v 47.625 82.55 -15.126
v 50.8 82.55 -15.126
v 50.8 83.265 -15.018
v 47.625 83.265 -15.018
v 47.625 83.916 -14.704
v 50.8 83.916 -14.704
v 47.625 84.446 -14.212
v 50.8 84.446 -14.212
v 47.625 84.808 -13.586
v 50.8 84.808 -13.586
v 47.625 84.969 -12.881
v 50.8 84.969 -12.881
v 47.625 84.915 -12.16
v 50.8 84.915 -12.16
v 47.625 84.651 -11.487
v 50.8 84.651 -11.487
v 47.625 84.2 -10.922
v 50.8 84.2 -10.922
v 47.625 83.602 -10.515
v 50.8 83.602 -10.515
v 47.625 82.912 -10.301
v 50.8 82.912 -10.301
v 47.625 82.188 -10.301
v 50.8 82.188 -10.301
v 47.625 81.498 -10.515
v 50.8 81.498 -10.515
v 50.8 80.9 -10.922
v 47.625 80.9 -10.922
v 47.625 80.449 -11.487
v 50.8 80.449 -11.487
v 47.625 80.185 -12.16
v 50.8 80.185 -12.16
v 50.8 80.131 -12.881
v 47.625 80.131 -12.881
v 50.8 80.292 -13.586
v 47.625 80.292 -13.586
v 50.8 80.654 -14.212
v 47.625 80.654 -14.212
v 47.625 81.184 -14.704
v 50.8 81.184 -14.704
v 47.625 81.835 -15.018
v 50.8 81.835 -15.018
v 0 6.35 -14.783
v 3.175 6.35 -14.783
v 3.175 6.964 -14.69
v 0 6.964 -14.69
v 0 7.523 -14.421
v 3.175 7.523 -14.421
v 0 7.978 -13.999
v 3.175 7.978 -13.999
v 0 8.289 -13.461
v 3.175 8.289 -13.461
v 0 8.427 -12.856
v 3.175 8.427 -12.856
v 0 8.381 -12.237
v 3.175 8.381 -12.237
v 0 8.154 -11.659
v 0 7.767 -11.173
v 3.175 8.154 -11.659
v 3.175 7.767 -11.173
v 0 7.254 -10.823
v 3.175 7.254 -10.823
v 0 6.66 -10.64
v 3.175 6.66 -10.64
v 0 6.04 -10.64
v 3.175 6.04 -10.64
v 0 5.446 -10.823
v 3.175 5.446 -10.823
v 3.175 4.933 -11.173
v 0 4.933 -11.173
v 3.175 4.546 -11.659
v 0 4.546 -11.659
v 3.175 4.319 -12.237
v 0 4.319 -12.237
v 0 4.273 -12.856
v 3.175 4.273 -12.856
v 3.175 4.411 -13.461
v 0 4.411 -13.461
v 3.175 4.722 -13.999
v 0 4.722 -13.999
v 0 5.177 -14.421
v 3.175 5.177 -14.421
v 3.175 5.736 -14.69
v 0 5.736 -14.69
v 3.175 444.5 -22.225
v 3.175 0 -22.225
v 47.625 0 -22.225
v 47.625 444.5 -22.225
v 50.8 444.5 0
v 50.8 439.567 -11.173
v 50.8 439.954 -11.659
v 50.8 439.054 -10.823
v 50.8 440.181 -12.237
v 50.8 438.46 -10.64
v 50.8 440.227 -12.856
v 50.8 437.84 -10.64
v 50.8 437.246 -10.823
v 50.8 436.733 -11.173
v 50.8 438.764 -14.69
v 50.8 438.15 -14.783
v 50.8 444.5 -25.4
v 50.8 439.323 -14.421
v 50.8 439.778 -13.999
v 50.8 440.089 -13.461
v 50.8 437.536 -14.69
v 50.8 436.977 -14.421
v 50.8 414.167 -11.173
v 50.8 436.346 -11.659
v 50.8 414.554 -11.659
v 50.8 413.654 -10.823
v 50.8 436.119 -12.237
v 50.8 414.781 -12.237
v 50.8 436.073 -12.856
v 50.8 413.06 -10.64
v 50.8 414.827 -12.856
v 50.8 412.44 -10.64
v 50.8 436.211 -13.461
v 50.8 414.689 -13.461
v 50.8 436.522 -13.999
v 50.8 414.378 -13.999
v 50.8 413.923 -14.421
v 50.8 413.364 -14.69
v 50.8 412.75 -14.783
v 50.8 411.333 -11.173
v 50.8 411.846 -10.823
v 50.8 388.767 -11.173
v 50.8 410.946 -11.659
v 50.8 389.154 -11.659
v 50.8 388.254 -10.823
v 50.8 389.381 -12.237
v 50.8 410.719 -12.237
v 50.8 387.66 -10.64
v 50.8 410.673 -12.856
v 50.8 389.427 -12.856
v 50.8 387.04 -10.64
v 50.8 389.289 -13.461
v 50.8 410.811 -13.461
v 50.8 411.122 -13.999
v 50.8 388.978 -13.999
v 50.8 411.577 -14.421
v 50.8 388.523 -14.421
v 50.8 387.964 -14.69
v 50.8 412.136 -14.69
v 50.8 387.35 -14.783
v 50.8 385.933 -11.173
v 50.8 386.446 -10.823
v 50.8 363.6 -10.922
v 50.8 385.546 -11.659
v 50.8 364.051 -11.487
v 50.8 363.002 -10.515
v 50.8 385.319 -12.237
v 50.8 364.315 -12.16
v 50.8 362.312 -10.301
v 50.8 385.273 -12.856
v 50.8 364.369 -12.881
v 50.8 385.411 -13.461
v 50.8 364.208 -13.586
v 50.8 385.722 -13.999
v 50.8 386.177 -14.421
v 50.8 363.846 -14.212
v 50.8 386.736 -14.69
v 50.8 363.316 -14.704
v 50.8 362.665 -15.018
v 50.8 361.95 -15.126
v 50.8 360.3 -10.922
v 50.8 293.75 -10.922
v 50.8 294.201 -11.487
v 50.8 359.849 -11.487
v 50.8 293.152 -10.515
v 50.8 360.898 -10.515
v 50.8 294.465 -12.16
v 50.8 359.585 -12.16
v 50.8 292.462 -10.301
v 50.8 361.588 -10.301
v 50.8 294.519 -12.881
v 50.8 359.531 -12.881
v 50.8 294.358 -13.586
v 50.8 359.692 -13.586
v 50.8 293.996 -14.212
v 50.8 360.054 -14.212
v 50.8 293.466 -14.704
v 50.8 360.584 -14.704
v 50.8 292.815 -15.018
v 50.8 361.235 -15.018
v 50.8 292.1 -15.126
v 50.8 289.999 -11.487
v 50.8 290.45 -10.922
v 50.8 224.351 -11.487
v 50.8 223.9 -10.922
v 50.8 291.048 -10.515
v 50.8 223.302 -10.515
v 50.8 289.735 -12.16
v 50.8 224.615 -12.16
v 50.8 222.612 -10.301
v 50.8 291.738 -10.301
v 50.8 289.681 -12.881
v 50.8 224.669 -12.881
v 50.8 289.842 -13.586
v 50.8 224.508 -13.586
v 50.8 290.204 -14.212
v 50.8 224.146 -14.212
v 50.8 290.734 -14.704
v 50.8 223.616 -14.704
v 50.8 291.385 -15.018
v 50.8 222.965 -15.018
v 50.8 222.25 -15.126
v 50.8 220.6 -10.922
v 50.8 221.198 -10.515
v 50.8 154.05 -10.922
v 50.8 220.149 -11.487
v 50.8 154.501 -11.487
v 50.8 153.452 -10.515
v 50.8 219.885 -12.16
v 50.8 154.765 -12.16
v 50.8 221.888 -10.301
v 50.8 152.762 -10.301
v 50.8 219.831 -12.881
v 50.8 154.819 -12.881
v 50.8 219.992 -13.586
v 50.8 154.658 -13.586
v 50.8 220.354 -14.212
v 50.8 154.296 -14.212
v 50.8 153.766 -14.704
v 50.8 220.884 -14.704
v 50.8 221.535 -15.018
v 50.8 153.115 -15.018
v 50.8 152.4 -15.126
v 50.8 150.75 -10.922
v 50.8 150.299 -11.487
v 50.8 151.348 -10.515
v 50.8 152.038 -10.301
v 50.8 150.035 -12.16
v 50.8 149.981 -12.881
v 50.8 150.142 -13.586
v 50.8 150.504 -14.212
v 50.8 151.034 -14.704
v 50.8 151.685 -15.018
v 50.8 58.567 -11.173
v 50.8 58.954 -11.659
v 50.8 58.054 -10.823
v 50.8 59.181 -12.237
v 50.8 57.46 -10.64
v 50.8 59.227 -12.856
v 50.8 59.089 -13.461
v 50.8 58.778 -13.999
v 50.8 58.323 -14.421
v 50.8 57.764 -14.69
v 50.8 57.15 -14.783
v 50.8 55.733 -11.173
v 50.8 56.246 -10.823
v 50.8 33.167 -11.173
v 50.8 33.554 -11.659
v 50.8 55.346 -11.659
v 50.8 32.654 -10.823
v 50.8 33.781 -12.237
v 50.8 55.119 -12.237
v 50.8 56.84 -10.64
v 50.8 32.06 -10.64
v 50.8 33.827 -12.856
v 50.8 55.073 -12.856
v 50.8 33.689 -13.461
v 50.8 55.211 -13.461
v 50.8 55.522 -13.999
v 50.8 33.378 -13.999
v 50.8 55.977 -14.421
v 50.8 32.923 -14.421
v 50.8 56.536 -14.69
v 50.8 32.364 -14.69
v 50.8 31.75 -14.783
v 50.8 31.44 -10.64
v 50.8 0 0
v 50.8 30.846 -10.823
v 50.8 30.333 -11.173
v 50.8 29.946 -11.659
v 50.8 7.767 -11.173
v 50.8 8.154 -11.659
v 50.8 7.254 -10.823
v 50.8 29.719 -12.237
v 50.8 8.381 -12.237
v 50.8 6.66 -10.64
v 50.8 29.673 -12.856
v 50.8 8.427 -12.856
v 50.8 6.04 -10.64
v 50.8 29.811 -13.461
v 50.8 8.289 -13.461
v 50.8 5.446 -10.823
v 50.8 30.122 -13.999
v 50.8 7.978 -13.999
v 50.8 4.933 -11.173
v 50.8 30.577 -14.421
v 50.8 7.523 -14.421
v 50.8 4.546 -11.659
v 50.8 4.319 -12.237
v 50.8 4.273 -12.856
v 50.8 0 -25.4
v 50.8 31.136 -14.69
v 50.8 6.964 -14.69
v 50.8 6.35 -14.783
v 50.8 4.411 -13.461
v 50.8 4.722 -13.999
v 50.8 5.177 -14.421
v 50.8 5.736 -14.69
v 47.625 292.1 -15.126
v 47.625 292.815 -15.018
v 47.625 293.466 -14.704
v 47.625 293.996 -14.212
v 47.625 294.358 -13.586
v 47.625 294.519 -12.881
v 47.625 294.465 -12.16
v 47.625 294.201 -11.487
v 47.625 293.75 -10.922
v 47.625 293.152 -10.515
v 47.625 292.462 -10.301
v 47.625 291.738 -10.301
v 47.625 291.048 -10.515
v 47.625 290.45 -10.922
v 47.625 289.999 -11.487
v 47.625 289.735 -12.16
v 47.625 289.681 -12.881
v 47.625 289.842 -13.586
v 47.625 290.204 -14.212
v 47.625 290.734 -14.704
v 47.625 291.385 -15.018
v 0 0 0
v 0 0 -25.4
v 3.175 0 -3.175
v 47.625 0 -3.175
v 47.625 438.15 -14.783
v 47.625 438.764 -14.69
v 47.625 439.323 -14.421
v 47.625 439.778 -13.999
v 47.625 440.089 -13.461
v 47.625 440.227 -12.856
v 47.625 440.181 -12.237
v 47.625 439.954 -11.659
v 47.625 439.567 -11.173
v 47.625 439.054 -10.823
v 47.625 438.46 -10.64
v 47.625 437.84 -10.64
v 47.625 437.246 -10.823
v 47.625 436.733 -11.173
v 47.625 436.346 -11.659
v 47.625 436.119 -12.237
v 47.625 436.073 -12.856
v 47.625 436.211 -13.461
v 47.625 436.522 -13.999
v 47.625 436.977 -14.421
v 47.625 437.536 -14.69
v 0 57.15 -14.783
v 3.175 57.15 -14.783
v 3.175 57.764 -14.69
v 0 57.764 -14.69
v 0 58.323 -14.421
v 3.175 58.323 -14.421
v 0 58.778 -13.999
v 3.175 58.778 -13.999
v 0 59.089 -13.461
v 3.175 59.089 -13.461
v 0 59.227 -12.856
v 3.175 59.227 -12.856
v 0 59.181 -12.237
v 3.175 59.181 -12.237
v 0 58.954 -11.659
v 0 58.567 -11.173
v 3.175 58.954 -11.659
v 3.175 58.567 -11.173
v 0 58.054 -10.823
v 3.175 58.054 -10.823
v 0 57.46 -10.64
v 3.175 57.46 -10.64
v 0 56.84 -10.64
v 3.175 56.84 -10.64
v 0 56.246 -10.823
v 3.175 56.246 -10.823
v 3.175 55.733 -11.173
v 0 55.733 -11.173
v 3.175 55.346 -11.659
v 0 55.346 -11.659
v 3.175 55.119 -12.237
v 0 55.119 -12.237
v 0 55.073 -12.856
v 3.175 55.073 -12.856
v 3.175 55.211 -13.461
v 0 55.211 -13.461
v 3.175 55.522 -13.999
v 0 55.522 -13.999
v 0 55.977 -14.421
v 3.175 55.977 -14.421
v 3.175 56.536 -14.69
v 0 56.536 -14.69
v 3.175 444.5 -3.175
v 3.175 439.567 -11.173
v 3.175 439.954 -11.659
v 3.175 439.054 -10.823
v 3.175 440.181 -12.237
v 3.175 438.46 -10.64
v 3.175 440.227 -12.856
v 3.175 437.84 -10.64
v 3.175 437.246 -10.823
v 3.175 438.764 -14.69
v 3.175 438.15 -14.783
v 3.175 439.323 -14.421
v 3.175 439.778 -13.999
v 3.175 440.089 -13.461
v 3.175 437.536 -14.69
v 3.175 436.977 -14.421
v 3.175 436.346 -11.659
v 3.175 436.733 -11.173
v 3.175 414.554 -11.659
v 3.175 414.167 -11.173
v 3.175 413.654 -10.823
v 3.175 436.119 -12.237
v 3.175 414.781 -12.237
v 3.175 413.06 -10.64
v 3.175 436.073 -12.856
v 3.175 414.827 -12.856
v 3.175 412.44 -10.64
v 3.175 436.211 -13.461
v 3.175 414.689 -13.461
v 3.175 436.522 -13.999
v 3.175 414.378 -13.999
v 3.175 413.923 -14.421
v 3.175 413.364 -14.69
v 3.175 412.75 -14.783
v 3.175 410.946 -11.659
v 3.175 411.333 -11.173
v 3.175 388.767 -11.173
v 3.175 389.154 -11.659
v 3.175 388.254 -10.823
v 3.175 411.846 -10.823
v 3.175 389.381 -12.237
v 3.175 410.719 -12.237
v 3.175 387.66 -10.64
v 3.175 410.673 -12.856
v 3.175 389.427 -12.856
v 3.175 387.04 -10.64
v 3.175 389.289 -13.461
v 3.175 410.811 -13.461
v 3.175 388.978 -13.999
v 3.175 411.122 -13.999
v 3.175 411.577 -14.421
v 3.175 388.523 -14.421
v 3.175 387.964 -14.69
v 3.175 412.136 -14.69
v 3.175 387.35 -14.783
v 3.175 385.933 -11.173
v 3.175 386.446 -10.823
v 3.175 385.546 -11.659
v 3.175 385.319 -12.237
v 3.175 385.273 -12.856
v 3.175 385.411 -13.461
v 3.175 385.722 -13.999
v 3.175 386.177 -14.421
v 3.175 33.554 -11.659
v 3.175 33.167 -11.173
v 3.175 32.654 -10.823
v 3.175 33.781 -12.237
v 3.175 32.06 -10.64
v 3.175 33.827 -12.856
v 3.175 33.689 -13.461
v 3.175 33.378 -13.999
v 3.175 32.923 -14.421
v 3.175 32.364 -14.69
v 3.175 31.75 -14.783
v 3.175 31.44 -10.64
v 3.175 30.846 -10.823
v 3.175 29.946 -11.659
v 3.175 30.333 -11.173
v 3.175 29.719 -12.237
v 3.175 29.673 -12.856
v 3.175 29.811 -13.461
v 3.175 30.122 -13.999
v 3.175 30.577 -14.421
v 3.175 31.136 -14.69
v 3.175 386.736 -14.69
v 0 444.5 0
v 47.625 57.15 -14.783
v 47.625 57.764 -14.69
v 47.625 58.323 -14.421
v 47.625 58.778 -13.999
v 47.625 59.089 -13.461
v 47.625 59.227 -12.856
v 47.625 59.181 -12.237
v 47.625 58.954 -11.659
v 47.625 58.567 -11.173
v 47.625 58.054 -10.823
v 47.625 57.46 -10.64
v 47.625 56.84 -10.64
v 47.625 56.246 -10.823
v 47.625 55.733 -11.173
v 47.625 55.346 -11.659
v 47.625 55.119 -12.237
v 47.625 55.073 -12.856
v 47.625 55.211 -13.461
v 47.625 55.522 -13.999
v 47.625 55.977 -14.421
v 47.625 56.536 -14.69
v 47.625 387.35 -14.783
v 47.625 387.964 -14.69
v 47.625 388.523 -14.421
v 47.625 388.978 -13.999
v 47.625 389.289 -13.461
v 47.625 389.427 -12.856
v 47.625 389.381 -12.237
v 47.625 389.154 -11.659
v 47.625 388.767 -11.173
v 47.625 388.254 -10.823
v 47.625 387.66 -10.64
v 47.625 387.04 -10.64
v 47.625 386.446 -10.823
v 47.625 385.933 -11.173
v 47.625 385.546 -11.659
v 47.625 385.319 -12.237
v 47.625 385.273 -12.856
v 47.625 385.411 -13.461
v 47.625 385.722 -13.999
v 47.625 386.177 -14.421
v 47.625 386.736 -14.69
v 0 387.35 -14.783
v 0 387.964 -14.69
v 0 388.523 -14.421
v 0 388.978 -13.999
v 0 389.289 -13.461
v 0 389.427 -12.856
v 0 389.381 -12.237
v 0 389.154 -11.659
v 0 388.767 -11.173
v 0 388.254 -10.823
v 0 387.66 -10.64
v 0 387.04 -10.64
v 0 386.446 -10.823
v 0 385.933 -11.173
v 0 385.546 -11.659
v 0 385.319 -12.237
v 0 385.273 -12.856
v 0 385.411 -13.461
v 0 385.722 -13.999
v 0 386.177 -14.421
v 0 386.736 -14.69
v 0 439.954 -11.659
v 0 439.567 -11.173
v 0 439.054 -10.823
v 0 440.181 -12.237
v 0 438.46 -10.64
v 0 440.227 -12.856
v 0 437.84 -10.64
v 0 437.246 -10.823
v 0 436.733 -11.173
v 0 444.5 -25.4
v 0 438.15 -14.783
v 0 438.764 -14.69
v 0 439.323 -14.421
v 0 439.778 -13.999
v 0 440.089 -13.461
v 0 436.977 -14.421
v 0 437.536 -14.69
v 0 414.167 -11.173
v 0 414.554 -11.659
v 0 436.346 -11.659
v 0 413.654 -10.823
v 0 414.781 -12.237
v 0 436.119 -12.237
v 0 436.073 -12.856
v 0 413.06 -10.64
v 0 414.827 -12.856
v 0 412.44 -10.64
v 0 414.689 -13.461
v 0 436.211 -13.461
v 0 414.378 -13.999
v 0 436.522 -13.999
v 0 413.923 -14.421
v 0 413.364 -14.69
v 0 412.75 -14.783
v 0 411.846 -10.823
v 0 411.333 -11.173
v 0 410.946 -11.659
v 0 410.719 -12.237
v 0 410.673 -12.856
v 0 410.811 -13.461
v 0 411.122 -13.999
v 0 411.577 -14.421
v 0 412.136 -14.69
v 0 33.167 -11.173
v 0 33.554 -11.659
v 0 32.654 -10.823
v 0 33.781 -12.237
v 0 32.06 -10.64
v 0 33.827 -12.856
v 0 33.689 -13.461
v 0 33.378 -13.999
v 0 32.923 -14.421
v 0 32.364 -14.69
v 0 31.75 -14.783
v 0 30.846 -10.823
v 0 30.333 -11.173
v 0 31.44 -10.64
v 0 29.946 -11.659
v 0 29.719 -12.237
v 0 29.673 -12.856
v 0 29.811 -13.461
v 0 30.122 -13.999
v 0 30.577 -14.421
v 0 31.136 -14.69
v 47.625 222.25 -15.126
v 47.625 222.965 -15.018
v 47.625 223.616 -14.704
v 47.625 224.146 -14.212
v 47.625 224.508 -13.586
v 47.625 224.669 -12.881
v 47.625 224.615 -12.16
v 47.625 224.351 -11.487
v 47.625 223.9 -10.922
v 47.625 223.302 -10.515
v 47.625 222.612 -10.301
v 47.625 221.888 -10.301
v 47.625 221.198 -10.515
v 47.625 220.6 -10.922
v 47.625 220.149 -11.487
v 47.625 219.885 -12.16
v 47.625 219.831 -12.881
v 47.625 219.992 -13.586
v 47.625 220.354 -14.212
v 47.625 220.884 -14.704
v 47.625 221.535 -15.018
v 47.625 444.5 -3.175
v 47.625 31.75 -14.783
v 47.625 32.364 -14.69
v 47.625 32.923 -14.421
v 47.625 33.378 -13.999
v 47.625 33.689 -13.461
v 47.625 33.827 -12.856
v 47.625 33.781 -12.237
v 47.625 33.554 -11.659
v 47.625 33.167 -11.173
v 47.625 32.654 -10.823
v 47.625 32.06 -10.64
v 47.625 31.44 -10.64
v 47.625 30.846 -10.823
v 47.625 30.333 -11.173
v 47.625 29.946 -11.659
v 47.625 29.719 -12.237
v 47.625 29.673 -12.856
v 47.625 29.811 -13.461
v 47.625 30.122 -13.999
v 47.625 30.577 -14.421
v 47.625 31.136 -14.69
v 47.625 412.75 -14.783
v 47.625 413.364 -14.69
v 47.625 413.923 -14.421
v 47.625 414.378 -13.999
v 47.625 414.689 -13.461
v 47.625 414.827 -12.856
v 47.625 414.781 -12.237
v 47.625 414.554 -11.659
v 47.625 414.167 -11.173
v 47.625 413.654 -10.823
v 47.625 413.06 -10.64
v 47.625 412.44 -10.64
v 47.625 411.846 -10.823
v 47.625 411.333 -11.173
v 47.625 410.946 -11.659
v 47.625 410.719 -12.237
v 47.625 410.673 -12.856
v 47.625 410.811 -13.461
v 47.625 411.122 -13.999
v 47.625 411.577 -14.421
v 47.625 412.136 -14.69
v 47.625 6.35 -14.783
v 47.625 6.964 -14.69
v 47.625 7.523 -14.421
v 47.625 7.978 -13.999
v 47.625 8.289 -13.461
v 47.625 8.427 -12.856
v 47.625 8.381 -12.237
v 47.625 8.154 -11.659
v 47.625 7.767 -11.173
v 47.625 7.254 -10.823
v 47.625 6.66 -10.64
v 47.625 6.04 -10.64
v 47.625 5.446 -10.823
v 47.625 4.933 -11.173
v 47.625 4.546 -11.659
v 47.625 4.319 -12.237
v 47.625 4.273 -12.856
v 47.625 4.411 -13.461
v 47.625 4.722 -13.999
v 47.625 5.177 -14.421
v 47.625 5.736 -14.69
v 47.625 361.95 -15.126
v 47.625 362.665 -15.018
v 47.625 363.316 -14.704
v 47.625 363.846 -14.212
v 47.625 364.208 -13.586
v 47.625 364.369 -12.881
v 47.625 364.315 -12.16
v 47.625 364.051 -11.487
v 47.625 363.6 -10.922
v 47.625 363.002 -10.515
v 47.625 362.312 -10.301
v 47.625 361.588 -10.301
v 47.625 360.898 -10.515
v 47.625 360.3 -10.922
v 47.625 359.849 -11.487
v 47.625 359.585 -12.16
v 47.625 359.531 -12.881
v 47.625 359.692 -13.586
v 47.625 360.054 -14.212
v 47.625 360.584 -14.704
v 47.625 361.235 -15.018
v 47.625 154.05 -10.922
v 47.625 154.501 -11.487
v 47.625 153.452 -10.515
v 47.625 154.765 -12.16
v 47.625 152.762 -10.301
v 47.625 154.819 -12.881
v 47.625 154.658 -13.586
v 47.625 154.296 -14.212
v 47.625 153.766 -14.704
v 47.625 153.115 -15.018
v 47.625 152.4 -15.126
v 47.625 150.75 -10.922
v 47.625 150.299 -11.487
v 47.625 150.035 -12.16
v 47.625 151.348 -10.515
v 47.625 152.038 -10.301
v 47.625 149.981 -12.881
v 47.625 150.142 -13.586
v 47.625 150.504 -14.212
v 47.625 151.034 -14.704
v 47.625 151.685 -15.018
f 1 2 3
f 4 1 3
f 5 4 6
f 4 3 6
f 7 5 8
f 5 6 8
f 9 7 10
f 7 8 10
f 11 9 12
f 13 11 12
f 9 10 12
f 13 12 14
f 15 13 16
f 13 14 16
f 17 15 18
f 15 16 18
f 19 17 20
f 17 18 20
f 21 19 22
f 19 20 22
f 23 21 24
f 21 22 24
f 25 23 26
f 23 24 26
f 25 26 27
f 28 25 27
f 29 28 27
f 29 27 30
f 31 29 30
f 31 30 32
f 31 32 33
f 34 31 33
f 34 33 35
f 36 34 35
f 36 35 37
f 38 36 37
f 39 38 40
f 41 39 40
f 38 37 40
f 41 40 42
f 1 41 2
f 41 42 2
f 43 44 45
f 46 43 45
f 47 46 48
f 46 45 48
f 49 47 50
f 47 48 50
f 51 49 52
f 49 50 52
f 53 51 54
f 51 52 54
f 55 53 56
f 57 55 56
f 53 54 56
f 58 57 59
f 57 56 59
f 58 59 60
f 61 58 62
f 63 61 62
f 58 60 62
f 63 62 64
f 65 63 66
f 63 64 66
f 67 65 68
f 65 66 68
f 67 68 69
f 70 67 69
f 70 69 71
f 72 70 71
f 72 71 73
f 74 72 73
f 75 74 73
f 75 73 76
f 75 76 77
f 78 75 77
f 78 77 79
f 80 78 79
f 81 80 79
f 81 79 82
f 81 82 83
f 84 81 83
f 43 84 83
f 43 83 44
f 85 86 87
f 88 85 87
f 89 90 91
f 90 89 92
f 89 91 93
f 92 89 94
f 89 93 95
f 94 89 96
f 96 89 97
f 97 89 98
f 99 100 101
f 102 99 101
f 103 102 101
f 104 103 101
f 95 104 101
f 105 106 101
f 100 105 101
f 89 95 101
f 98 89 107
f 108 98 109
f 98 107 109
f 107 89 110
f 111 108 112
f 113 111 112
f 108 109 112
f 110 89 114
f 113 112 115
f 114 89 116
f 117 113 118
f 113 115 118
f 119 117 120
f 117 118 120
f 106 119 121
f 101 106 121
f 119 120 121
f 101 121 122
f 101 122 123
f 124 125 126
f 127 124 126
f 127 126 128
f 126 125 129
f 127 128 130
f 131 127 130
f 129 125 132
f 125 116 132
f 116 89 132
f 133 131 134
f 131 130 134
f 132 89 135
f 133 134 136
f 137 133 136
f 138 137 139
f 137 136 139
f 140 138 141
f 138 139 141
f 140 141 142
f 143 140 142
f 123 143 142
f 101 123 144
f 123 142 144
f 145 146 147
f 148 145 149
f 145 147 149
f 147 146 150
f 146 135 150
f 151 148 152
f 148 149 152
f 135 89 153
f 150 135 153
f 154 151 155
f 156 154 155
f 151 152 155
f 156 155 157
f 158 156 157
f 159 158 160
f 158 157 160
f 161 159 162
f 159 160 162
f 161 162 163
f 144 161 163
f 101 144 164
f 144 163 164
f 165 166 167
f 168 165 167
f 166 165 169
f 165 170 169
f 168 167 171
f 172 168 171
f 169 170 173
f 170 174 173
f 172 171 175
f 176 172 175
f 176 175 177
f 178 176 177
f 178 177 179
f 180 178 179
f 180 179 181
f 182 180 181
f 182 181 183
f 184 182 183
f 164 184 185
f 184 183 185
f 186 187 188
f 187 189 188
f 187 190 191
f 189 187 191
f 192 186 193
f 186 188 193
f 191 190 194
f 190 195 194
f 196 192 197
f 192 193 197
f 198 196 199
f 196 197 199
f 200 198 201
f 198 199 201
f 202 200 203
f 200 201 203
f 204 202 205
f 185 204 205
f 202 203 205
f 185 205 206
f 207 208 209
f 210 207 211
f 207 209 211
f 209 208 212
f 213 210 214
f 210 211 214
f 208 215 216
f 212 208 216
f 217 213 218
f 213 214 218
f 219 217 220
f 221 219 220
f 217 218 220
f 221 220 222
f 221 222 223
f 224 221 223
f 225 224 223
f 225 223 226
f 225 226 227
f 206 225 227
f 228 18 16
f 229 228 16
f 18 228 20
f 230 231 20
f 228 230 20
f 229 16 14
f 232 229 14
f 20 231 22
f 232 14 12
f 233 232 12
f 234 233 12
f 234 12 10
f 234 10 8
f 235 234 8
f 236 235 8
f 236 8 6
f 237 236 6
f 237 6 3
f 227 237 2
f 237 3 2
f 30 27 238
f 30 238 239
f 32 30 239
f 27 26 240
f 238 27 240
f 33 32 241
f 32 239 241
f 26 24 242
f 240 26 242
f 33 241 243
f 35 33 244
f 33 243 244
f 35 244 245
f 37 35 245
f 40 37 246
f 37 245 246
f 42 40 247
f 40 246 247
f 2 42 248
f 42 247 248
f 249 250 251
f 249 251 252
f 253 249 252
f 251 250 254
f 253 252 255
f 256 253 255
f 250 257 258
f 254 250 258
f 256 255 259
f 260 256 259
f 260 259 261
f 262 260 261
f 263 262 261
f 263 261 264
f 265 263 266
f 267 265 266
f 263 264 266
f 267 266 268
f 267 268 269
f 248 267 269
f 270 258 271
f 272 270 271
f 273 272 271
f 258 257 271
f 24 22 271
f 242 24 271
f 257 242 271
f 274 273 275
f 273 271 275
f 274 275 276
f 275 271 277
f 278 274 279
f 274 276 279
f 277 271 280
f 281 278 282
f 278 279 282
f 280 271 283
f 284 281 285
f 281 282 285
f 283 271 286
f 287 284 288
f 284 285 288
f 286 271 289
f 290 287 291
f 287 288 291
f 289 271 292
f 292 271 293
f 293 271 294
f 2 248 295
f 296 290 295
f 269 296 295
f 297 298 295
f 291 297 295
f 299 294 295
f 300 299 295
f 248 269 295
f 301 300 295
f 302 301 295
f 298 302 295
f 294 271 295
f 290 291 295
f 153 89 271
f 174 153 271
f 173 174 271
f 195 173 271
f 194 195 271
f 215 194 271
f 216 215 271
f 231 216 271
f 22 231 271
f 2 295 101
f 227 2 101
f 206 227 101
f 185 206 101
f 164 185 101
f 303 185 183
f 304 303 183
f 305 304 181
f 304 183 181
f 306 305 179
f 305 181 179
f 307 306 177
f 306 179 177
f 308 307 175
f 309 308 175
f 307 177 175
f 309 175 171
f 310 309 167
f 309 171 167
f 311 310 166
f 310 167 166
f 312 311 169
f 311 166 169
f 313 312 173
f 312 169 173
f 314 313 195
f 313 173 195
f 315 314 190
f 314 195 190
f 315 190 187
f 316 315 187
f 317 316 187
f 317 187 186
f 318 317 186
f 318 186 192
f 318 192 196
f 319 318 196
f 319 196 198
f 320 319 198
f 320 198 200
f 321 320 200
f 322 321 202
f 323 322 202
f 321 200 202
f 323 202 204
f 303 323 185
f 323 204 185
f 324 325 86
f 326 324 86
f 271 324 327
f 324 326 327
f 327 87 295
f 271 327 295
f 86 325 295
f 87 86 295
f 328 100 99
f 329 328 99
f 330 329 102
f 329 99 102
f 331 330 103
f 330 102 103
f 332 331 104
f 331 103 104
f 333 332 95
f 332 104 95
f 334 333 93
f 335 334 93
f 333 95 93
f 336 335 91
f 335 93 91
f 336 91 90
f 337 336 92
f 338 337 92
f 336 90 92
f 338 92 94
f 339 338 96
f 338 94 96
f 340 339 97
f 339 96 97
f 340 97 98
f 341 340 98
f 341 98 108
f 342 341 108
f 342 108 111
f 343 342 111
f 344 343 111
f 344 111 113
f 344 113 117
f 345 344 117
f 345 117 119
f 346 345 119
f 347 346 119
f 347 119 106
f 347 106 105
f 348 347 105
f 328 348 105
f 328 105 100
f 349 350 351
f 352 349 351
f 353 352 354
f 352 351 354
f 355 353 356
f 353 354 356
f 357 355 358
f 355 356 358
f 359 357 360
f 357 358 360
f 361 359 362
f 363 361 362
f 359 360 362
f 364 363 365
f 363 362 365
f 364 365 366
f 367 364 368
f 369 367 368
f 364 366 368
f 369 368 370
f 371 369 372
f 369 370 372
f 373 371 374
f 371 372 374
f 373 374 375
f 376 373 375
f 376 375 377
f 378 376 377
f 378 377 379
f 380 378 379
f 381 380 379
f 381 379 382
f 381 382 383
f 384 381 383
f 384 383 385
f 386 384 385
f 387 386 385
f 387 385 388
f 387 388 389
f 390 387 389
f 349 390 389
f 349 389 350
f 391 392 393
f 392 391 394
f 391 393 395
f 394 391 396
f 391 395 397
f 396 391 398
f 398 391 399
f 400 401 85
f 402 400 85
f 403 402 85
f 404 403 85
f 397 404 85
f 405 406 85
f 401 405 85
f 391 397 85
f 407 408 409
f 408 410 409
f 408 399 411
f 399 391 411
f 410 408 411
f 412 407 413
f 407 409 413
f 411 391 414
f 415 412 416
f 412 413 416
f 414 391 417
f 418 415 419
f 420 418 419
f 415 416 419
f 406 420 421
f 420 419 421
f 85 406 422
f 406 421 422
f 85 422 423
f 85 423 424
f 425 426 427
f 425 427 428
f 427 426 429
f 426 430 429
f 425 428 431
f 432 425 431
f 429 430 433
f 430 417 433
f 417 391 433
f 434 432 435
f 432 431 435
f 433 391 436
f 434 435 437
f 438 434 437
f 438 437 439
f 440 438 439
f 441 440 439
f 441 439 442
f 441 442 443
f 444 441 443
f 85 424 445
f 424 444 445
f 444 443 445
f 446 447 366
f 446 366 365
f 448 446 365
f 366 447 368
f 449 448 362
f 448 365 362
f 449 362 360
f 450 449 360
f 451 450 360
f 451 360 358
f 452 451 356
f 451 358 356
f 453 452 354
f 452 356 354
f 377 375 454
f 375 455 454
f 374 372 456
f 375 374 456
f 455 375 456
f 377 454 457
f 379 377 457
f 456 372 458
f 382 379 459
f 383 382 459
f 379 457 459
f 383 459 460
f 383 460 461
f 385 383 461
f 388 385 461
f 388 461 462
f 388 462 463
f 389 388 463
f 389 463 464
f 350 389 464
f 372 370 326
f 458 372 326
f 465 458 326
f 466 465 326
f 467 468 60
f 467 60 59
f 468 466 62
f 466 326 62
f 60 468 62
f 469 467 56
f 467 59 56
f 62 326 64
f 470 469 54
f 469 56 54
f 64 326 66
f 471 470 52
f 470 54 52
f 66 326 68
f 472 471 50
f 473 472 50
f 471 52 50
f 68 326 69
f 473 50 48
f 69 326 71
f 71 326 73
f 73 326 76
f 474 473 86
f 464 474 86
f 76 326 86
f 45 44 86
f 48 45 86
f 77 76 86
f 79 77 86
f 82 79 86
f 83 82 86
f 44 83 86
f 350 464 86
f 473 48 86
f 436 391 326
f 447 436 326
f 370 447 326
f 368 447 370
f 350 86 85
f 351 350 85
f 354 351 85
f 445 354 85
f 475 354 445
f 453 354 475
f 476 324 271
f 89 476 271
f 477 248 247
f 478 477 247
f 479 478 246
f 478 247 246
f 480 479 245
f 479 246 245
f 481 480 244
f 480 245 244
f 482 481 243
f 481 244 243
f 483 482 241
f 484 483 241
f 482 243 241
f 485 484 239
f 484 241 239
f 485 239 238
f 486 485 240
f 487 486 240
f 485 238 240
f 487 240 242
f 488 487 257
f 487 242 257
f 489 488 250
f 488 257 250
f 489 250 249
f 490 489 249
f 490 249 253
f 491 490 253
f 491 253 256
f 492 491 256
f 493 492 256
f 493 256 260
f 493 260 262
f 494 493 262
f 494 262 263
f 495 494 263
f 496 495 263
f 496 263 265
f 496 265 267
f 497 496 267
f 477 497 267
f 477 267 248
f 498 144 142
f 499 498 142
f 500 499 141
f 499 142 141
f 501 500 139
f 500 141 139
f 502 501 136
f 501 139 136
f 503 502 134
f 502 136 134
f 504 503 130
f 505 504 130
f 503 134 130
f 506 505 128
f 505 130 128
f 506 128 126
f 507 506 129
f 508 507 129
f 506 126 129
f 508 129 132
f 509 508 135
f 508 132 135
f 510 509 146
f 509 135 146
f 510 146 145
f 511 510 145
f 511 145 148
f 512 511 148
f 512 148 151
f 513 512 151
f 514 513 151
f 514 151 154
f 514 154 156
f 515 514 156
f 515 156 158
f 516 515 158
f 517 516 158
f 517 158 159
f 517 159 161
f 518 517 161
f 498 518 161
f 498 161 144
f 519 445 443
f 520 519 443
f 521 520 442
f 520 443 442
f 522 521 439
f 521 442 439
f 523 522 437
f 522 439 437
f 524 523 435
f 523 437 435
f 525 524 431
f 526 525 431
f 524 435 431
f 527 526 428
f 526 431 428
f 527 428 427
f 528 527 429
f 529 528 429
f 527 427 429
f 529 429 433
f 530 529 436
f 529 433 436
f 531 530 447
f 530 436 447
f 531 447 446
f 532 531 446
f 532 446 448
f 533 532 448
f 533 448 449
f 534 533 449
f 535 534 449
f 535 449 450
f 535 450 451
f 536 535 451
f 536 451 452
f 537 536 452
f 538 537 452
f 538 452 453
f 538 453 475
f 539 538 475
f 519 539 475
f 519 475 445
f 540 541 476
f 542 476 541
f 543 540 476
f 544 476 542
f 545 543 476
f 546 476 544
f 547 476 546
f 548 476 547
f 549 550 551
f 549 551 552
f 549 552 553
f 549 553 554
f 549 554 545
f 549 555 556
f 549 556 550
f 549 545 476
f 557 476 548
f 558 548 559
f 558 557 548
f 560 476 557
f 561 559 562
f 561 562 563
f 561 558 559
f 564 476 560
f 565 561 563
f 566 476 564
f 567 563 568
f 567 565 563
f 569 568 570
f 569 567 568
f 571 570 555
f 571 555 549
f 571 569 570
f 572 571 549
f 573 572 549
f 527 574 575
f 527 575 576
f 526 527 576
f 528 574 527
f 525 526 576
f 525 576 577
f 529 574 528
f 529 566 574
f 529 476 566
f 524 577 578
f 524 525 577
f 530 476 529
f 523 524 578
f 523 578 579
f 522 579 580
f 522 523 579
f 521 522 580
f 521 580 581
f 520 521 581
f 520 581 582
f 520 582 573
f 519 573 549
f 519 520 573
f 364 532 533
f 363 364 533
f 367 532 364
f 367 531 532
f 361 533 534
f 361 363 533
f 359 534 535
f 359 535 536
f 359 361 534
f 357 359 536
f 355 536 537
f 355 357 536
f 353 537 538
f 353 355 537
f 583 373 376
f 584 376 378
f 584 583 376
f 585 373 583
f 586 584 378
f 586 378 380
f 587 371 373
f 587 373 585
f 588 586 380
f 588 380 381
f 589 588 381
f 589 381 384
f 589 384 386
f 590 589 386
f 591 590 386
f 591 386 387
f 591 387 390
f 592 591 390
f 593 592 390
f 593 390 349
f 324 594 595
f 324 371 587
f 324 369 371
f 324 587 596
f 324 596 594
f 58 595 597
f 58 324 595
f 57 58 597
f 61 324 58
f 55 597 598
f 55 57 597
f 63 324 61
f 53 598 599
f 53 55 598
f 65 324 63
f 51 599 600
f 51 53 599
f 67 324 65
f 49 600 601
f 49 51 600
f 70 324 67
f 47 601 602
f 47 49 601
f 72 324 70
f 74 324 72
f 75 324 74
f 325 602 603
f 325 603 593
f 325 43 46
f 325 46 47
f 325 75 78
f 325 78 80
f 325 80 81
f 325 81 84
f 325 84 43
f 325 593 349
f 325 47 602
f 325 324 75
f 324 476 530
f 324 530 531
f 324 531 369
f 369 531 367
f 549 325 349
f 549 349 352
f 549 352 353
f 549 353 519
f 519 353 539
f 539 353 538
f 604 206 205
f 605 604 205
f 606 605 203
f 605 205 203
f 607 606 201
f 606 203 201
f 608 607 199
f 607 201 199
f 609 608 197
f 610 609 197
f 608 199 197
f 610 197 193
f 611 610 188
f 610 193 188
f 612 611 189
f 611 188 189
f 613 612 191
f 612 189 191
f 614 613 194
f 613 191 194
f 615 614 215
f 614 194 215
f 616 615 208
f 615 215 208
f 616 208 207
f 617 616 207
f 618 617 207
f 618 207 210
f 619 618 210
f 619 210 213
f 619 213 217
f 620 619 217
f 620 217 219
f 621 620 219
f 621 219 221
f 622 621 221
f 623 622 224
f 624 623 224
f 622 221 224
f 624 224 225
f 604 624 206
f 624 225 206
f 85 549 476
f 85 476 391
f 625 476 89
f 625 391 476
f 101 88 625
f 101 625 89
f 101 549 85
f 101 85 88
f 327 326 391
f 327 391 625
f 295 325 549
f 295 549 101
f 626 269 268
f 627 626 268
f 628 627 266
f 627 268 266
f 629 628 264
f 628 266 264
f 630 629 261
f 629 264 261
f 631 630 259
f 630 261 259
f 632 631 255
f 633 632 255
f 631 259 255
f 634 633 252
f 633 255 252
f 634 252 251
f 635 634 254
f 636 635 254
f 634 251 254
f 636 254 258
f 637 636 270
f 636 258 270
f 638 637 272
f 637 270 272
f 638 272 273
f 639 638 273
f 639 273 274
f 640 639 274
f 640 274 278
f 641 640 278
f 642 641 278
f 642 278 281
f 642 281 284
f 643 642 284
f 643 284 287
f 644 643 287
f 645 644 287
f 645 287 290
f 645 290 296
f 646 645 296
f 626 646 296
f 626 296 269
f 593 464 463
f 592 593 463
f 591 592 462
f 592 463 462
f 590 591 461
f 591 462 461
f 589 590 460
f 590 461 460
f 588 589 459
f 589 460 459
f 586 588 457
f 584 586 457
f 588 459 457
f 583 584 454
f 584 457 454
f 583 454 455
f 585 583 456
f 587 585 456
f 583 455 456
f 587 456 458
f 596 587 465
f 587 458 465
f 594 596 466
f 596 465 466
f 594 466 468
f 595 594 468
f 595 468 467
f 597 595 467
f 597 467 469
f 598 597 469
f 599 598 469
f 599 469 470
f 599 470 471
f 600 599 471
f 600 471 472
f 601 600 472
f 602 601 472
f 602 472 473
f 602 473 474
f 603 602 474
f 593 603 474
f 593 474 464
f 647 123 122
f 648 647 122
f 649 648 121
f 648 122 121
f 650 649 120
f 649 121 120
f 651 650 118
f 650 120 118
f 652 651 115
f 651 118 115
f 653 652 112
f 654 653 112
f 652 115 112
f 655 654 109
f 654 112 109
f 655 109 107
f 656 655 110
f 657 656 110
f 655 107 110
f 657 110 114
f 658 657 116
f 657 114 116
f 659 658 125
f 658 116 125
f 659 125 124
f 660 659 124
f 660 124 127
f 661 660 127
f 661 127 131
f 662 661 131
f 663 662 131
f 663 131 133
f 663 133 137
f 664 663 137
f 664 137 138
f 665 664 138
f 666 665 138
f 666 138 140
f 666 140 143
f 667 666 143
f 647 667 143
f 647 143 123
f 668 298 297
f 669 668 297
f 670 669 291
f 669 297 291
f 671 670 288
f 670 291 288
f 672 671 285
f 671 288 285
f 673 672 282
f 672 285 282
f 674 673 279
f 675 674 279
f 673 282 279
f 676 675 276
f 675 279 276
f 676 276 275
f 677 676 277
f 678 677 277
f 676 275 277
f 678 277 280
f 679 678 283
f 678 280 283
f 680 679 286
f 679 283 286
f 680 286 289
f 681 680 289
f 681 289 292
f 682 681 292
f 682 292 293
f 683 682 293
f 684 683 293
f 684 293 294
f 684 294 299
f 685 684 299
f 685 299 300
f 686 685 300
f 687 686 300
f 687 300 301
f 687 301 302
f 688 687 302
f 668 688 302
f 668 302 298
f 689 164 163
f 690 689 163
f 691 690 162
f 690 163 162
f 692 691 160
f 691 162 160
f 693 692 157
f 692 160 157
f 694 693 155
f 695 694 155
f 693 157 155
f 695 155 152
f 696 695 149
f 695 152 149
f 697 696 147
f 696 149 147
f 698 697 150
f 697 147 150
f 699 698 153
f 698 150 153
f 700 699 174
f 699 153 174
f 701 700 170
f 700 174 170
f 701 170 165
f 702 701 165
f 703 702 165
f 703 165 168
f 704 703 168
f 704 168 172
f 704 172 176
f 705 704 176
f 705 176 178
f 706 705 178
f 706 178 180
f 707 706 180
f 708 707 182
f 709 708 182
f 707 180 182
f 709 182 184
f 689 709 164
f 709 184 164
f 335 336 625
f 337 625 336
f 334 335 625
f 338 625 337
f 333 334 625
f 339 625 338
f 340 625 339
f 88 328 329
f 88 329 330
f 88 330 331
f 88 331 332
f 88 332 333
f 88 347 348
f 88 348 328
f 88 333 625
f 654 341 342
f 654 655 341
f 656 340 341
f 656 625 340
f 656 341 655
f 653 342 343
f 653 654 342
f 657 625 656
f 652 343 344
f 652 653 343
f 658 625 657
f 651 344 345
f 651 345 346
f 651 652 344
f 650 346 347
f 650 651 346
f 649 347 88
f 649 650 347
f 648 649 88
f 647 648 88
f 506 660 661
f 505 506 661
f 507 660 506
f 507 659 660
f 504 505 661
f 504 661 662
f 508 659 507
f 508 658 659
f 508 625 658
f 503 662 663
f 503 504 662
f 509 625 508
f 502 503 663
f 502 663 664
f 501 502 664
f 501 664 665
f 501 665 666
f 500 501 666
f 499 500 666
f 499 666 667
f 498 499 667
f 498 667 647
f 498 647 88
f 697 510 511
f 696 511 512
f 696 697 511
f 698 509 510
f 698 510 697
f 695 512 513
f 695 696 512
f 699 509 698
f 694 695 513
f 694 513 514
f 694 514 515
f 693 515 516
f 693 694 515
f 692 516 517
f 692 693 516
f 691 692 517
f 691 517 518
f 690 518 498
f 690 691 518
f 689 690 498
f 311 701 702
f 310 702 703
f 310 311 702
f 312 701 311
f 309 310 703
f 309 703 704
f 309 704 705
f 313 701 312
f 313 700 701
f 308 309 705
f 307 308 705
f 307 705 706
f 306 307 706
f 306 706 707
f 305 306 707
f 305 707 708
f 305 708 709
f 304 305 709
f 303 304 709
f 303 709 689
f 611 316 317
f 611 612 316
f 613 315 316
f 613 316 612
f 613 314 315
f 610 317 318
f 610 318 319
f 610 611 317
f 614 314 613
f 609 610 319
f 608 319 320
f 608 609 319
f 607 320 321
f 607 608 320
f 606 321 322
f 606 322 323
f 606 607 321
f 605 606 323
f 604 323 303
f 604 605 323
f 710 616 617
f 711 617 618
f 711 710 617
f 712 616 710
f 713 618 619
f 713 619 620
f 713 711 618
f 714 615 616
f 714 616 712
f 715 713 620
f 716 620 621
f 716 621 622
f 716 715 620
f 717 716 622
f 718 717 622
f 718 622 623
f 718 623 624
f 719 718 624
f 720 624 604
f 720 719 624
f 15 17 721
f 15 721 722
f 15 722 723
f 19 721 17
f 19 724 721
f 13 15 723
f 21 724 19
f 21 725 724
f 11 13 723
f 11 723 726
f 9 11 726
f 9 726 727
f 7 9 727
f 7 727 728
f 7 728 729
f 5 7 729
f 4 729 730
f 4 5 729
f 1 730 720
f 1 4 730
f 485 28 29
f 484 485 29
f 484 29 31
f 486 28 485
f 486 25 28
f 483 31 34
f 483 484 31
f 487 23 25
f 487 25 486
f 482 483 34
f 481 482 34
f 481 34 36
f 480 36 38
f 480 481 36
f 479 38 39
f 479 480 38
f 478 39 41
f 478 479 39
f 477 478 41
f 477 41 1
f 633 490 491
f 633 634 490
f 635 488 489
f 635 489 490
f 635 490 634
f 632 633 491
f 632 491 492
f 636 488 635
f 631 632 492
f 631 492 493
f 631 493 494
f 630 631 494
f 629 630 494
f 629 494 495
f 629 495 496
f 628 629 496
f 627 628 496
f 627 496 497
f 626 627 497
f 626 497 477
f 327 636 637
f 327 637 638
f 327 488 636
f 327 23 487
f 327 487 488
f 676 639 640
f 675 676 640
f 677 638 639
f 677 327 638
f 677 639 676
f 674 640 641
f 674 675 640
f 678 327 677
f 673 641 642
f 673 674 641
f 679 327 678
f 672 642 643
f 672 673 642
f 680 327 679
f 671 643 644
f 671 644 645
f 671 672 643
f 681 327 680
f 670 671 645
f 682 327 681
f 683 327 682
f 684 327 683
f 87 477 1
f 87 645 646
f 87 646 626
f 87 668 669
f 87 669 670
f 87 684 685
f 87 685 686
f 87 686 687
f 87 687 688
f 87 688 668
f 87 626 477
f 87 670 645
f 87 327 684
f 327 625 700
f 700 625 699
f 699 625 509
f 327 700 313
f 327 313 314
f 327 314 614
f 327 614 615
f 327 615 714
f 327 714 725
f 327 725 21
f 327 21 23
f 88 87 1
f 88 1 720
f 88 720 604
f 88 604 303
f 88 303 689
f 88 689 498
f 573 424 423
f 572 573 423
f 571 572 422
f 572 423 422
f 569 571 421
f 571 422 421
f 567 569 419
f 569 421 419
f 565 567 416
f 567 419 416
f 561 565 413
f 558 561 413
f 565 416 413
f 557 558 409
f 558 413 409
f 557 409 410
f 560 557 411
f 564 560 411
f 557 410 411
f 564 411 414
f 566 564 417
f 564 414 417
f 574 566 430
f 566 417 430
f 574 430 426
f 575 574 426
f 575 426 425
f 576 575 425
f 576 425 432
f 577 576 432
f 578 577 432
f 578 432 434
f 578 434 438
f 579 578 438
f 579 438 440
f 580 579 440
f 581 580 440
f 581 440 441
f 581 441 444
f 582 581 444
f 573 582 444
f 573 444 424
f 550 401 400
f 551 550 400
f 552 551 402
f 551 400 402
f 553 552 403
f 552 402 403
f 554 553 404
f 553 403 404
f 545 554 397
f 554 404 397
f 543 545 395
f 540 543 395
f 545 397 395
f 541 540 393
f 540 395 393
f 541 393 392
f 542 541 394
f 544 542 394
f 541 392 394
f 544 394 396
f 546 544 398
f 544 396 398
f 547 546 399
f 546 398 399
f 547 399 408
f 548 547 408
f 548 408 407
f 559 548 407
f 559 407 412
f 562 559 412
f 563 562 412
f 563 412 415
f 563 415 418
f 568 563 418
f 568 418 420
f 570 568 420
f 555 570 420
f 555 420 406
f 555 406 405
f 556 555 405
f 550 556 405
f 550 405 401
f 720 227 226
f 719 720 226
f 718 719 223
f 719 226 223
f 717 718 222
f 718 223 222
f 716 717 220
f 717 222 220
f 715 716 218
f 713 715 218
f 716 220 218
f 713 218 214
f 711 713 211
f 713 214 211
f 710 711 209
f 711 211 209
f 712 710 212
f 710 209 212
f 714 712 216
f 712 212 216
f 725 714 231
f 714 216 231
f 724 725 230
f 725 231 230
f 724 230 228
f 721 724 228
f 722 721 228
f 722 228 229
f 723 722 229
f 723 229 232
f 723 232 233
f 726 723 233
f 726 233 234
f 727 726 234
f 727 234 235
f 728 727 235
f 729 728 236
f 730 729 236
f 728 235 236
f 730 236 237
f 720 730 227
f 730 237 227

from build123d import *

# Parameters (mm, degrees)
SKETCH1_W           = 50.8
SKETCH1_H           = 25.4
SKETCH1_W_2         = 44.45
SKETCH1_H_2         = 19.05
BOSS_EXTRUDE1_DEPTH = 444.5
CUT_EXTRUDE1_REACH  = 412.536
SKETCH2_R           = 2.0828
SKETCH3_R           = 2.4257
CUT_EXTRUDE2_DEPTH  = 3.175


with BuildPart() as part:
    # Sketch1 → Boss-Extrude1 (new body)
    with BuildSketch(Plane(origin=(0, 0, 0), x_dir=(1, 0, 0), z_dir=(0, 1, 0))):
        with Locations((25.4, 12.7)):
            Rectangle(SKETCH1_W, SKETCH1_H)
        with Locations((25.4, 12.7)):
            Rectangle(SKETCH1_W_2, SKETCH1_H_2, mode=Mode.SUBTRACT)
    extrude(amount=BOSS_EXTRUDE1_DEPTH)

    # Cut-Extrude1: up to this face of the body (flat: up to its plane)
    cut_extrude1_end = Plane(part.part.faces().sort_by_distance((0, 222.25, -12.7))[0])
    # Sketch2 → Cut-Extrude1 (cut, up to the picked face)
    with BuildSketch(Plane(origin=(50.8, 398.917681448, 57.205629331), x_dir=(0, 0, 1), z_dir=(1, 0, 0)), mode=Mode.PRIVATE) as cut_extrude1_sk1:
        with Locations(Location((-69.905629331, -39.232318552, 0), (0, 0, 180))):
            Circle(SKETCH2_R)
    cut_extrude1_tool1 = split(extrude(cut_extrude1_sk1.sketch, amount=-CUT_EXTRUDE1_REACH, mode=Mode.PRIVATE), bisect_by=cut_extrude1_end, keep=Keep.BOTH, mode=Mode.PRIVATE)
    # Sketch2 → Cut-Extrude1 (cut, up to the picked face)
    with BuildSketch(Plane(origin=(50.8, 398.917681448, 57.205629331), x_dir=(0, 0, 1), z_dir=(1, 0, 0)), mode=Mode.PRIVATE) as cut_extrude1_sk2:
        with Locations(Location((-69.905629331, -13.832318552, 0), (0, 0, 180))):
            Circle(SKETCH2_R)
    cut_extrude1_tool2 = split(extrude(cut_extrude1_sk2.sketch, amount=-CUT_EXTRUDE1_REACH, mode=Mode.PRIVATE), bisect_by=cut_extrude1_end, keep=Keep.BOTH, mode=Mode.PRIVATE)
    # Sketch2 → Cut-Extrude1 (cut, up to the picked face)
    with BuildSketch(Plane(origin=(50.8, 398.917681448, 57.205629331), x_dir=(0, 0, 1), z_dir=(1, 0, 0)), mode=Mode.PRIVATE) as cut_extrude1_sk3:
        with Locations(Location((-69.905629331, 11.567681448, 0), (0, 0, 180))):
            Circle(SKETCH2_R)
    cut_extrude1_tool3 = split(extrude(cut_extrude1_sk3.sketch, amount=-CUT_EXTRUDE1_REACH, mode=Mode.PRIVATE), bisect_by=cut_extrude1_end, keep=Keep.BOTH, mode=Mode.PRIVATE)
    # Sketch2 → Cut-Extrude1 (cut, up to the picked face)
    with BuildSketch(Plane(origin=(50.8, 398.917681448, 57.205629331), x_dir=(0, 0, 1), z_dir=(1, 0, 0)), mode=Mode.PRIVATE) as cut_extrude1_sk4:
        with Locations(Location((-69.905629331, 341.767681448, 0), (0, 0, 180))):
            Circle(SKETCH2_R)
    cut_extrude1_tool4 = split(extrude(cut_extrude1_sk4.sketch, amount=-CUT_EXTRUDE1_REACH, mode=Mode.PRIVATE), bisect_by=cut_extrude1_end, keep=Keep.BOTH, mode=Mode.PRIVATE)
    # Sketch2 → Cut-Extrude1 (cut, up to the picked face)
    with BuildSketch(Plane(origin=(50.8, 398.917681448, 57.205629331), x_dir=(0, 0, 1), z_dir=(1, 0, 0)), mode=Mode.PRIVATE) as cut_extrude1_sk5:
        with Locations(Location((-69.905629331, 367.167681448, 0), (0, 0, 180))):
            Circle(SKETCH2_R)
    cut_extrude1_tool5 = split(extrude(cut_extrude1_sk5.sketch, amount=-CUT_EXTRUDE1_REACH, mode=Mode.PRIVATE), bisect_by=cut_extrude1_end, keep=Keep.BOTH, mode=Mode.PRIVATE)
    # Sketch2 → Cut-Extrude1 (cut, up to the picked face)
    with BuildSketch(Plane(origin=(50.8, 398.917681448, 57.205629331), x_dir=(0, 0, 1), z_dir=(1, 0, 0)), mode=Mode.PRIVATE) as cut_extrude1_sk6:
        with Locations(Location((-69.905629331, 392.567681448, 0), (0, 0, 180))):
            Circle(SKETCH2_R)
    cut_extrude1_tool6 = split(extrude(cut_extrude1_sk6.sketch, amount=-CUT_EXTRUDE1_REACH, mode=Mode.PRIVATE), bisect_by=cut_extrude1_end, keep=Keep.BOTH, mode=Mode.PRIVATE)
    add(cut_extrude1_tool1.solids().sort_by(Axis((50.8, 438.15, -12.7), (-1, 0, 0)))[0], mode=Mode.SUBTRACT)
    add(cut_extrude1_tool2.solids().sort_by(Axis((50.8, 412.75, -12.7), (-1, 0, 0)))[0], mode=Mode.SUBTRACT)
    add(cut_extrude1_tool3.solids().sort_by(Axis((50.8, 387.35, -12.7), (-1, 0, 0)))[0], mode=Mode.SUBTRACT)
    add(cut_extrude1_tool4.solids().sort_by(Axis((50.8, 57.15, -12.7), (-1, 0, 0)))[0], mode=Mode.SUBTRACT)
    add(cut_extrude1_tool5.solids().sort_by(Axis((50.8, 31.75, -12.7), (-1, 0, 0)))[0], mode=Mode.SUBTRACT)
    add(cut_extrude1_tool6.solids().sort_by(Axis((50.8, 6.35, -12.7), (-1, 0, 0)))[0], mode=Mode.SUBTRACT)

    # Sketch3 → Cut-Extrude2 (cut)
    with BuildSketch(Plane(origin=(50.8, 398.917681448, 57.205629331), x_dir=(0, 0, 1), z_dir=(1, 0, 0))):
        with Locations(Location((-69.905629331, 36.967681448, 0), (0, 0, 180))):
            Circle(SKETCH3_R)
        with Locations(Location((-69.905629331, 106.817681448, 0), (0, 0, 180))):
            Circle(SKETCH3_R)
        with Locations(Location((-69.905629331, 176.667681448, 0), (0, 0, 180))):
            Circle(SKETCH3_R)
        with Locations(Location((-69.905629331, 246.517681448, 0), (0, 0, 180))):
            Circle(SKETCH3_R)
        with Locations(Location((-69.905629331, 316.367681448, 0), (0, 0, 180))):
            Circle(SKETCH3_R)
    extrude(amount=-CUT_EXTRUDE2_DEPTH, mode=Mode.SUBTRACT)


solid = part.part
